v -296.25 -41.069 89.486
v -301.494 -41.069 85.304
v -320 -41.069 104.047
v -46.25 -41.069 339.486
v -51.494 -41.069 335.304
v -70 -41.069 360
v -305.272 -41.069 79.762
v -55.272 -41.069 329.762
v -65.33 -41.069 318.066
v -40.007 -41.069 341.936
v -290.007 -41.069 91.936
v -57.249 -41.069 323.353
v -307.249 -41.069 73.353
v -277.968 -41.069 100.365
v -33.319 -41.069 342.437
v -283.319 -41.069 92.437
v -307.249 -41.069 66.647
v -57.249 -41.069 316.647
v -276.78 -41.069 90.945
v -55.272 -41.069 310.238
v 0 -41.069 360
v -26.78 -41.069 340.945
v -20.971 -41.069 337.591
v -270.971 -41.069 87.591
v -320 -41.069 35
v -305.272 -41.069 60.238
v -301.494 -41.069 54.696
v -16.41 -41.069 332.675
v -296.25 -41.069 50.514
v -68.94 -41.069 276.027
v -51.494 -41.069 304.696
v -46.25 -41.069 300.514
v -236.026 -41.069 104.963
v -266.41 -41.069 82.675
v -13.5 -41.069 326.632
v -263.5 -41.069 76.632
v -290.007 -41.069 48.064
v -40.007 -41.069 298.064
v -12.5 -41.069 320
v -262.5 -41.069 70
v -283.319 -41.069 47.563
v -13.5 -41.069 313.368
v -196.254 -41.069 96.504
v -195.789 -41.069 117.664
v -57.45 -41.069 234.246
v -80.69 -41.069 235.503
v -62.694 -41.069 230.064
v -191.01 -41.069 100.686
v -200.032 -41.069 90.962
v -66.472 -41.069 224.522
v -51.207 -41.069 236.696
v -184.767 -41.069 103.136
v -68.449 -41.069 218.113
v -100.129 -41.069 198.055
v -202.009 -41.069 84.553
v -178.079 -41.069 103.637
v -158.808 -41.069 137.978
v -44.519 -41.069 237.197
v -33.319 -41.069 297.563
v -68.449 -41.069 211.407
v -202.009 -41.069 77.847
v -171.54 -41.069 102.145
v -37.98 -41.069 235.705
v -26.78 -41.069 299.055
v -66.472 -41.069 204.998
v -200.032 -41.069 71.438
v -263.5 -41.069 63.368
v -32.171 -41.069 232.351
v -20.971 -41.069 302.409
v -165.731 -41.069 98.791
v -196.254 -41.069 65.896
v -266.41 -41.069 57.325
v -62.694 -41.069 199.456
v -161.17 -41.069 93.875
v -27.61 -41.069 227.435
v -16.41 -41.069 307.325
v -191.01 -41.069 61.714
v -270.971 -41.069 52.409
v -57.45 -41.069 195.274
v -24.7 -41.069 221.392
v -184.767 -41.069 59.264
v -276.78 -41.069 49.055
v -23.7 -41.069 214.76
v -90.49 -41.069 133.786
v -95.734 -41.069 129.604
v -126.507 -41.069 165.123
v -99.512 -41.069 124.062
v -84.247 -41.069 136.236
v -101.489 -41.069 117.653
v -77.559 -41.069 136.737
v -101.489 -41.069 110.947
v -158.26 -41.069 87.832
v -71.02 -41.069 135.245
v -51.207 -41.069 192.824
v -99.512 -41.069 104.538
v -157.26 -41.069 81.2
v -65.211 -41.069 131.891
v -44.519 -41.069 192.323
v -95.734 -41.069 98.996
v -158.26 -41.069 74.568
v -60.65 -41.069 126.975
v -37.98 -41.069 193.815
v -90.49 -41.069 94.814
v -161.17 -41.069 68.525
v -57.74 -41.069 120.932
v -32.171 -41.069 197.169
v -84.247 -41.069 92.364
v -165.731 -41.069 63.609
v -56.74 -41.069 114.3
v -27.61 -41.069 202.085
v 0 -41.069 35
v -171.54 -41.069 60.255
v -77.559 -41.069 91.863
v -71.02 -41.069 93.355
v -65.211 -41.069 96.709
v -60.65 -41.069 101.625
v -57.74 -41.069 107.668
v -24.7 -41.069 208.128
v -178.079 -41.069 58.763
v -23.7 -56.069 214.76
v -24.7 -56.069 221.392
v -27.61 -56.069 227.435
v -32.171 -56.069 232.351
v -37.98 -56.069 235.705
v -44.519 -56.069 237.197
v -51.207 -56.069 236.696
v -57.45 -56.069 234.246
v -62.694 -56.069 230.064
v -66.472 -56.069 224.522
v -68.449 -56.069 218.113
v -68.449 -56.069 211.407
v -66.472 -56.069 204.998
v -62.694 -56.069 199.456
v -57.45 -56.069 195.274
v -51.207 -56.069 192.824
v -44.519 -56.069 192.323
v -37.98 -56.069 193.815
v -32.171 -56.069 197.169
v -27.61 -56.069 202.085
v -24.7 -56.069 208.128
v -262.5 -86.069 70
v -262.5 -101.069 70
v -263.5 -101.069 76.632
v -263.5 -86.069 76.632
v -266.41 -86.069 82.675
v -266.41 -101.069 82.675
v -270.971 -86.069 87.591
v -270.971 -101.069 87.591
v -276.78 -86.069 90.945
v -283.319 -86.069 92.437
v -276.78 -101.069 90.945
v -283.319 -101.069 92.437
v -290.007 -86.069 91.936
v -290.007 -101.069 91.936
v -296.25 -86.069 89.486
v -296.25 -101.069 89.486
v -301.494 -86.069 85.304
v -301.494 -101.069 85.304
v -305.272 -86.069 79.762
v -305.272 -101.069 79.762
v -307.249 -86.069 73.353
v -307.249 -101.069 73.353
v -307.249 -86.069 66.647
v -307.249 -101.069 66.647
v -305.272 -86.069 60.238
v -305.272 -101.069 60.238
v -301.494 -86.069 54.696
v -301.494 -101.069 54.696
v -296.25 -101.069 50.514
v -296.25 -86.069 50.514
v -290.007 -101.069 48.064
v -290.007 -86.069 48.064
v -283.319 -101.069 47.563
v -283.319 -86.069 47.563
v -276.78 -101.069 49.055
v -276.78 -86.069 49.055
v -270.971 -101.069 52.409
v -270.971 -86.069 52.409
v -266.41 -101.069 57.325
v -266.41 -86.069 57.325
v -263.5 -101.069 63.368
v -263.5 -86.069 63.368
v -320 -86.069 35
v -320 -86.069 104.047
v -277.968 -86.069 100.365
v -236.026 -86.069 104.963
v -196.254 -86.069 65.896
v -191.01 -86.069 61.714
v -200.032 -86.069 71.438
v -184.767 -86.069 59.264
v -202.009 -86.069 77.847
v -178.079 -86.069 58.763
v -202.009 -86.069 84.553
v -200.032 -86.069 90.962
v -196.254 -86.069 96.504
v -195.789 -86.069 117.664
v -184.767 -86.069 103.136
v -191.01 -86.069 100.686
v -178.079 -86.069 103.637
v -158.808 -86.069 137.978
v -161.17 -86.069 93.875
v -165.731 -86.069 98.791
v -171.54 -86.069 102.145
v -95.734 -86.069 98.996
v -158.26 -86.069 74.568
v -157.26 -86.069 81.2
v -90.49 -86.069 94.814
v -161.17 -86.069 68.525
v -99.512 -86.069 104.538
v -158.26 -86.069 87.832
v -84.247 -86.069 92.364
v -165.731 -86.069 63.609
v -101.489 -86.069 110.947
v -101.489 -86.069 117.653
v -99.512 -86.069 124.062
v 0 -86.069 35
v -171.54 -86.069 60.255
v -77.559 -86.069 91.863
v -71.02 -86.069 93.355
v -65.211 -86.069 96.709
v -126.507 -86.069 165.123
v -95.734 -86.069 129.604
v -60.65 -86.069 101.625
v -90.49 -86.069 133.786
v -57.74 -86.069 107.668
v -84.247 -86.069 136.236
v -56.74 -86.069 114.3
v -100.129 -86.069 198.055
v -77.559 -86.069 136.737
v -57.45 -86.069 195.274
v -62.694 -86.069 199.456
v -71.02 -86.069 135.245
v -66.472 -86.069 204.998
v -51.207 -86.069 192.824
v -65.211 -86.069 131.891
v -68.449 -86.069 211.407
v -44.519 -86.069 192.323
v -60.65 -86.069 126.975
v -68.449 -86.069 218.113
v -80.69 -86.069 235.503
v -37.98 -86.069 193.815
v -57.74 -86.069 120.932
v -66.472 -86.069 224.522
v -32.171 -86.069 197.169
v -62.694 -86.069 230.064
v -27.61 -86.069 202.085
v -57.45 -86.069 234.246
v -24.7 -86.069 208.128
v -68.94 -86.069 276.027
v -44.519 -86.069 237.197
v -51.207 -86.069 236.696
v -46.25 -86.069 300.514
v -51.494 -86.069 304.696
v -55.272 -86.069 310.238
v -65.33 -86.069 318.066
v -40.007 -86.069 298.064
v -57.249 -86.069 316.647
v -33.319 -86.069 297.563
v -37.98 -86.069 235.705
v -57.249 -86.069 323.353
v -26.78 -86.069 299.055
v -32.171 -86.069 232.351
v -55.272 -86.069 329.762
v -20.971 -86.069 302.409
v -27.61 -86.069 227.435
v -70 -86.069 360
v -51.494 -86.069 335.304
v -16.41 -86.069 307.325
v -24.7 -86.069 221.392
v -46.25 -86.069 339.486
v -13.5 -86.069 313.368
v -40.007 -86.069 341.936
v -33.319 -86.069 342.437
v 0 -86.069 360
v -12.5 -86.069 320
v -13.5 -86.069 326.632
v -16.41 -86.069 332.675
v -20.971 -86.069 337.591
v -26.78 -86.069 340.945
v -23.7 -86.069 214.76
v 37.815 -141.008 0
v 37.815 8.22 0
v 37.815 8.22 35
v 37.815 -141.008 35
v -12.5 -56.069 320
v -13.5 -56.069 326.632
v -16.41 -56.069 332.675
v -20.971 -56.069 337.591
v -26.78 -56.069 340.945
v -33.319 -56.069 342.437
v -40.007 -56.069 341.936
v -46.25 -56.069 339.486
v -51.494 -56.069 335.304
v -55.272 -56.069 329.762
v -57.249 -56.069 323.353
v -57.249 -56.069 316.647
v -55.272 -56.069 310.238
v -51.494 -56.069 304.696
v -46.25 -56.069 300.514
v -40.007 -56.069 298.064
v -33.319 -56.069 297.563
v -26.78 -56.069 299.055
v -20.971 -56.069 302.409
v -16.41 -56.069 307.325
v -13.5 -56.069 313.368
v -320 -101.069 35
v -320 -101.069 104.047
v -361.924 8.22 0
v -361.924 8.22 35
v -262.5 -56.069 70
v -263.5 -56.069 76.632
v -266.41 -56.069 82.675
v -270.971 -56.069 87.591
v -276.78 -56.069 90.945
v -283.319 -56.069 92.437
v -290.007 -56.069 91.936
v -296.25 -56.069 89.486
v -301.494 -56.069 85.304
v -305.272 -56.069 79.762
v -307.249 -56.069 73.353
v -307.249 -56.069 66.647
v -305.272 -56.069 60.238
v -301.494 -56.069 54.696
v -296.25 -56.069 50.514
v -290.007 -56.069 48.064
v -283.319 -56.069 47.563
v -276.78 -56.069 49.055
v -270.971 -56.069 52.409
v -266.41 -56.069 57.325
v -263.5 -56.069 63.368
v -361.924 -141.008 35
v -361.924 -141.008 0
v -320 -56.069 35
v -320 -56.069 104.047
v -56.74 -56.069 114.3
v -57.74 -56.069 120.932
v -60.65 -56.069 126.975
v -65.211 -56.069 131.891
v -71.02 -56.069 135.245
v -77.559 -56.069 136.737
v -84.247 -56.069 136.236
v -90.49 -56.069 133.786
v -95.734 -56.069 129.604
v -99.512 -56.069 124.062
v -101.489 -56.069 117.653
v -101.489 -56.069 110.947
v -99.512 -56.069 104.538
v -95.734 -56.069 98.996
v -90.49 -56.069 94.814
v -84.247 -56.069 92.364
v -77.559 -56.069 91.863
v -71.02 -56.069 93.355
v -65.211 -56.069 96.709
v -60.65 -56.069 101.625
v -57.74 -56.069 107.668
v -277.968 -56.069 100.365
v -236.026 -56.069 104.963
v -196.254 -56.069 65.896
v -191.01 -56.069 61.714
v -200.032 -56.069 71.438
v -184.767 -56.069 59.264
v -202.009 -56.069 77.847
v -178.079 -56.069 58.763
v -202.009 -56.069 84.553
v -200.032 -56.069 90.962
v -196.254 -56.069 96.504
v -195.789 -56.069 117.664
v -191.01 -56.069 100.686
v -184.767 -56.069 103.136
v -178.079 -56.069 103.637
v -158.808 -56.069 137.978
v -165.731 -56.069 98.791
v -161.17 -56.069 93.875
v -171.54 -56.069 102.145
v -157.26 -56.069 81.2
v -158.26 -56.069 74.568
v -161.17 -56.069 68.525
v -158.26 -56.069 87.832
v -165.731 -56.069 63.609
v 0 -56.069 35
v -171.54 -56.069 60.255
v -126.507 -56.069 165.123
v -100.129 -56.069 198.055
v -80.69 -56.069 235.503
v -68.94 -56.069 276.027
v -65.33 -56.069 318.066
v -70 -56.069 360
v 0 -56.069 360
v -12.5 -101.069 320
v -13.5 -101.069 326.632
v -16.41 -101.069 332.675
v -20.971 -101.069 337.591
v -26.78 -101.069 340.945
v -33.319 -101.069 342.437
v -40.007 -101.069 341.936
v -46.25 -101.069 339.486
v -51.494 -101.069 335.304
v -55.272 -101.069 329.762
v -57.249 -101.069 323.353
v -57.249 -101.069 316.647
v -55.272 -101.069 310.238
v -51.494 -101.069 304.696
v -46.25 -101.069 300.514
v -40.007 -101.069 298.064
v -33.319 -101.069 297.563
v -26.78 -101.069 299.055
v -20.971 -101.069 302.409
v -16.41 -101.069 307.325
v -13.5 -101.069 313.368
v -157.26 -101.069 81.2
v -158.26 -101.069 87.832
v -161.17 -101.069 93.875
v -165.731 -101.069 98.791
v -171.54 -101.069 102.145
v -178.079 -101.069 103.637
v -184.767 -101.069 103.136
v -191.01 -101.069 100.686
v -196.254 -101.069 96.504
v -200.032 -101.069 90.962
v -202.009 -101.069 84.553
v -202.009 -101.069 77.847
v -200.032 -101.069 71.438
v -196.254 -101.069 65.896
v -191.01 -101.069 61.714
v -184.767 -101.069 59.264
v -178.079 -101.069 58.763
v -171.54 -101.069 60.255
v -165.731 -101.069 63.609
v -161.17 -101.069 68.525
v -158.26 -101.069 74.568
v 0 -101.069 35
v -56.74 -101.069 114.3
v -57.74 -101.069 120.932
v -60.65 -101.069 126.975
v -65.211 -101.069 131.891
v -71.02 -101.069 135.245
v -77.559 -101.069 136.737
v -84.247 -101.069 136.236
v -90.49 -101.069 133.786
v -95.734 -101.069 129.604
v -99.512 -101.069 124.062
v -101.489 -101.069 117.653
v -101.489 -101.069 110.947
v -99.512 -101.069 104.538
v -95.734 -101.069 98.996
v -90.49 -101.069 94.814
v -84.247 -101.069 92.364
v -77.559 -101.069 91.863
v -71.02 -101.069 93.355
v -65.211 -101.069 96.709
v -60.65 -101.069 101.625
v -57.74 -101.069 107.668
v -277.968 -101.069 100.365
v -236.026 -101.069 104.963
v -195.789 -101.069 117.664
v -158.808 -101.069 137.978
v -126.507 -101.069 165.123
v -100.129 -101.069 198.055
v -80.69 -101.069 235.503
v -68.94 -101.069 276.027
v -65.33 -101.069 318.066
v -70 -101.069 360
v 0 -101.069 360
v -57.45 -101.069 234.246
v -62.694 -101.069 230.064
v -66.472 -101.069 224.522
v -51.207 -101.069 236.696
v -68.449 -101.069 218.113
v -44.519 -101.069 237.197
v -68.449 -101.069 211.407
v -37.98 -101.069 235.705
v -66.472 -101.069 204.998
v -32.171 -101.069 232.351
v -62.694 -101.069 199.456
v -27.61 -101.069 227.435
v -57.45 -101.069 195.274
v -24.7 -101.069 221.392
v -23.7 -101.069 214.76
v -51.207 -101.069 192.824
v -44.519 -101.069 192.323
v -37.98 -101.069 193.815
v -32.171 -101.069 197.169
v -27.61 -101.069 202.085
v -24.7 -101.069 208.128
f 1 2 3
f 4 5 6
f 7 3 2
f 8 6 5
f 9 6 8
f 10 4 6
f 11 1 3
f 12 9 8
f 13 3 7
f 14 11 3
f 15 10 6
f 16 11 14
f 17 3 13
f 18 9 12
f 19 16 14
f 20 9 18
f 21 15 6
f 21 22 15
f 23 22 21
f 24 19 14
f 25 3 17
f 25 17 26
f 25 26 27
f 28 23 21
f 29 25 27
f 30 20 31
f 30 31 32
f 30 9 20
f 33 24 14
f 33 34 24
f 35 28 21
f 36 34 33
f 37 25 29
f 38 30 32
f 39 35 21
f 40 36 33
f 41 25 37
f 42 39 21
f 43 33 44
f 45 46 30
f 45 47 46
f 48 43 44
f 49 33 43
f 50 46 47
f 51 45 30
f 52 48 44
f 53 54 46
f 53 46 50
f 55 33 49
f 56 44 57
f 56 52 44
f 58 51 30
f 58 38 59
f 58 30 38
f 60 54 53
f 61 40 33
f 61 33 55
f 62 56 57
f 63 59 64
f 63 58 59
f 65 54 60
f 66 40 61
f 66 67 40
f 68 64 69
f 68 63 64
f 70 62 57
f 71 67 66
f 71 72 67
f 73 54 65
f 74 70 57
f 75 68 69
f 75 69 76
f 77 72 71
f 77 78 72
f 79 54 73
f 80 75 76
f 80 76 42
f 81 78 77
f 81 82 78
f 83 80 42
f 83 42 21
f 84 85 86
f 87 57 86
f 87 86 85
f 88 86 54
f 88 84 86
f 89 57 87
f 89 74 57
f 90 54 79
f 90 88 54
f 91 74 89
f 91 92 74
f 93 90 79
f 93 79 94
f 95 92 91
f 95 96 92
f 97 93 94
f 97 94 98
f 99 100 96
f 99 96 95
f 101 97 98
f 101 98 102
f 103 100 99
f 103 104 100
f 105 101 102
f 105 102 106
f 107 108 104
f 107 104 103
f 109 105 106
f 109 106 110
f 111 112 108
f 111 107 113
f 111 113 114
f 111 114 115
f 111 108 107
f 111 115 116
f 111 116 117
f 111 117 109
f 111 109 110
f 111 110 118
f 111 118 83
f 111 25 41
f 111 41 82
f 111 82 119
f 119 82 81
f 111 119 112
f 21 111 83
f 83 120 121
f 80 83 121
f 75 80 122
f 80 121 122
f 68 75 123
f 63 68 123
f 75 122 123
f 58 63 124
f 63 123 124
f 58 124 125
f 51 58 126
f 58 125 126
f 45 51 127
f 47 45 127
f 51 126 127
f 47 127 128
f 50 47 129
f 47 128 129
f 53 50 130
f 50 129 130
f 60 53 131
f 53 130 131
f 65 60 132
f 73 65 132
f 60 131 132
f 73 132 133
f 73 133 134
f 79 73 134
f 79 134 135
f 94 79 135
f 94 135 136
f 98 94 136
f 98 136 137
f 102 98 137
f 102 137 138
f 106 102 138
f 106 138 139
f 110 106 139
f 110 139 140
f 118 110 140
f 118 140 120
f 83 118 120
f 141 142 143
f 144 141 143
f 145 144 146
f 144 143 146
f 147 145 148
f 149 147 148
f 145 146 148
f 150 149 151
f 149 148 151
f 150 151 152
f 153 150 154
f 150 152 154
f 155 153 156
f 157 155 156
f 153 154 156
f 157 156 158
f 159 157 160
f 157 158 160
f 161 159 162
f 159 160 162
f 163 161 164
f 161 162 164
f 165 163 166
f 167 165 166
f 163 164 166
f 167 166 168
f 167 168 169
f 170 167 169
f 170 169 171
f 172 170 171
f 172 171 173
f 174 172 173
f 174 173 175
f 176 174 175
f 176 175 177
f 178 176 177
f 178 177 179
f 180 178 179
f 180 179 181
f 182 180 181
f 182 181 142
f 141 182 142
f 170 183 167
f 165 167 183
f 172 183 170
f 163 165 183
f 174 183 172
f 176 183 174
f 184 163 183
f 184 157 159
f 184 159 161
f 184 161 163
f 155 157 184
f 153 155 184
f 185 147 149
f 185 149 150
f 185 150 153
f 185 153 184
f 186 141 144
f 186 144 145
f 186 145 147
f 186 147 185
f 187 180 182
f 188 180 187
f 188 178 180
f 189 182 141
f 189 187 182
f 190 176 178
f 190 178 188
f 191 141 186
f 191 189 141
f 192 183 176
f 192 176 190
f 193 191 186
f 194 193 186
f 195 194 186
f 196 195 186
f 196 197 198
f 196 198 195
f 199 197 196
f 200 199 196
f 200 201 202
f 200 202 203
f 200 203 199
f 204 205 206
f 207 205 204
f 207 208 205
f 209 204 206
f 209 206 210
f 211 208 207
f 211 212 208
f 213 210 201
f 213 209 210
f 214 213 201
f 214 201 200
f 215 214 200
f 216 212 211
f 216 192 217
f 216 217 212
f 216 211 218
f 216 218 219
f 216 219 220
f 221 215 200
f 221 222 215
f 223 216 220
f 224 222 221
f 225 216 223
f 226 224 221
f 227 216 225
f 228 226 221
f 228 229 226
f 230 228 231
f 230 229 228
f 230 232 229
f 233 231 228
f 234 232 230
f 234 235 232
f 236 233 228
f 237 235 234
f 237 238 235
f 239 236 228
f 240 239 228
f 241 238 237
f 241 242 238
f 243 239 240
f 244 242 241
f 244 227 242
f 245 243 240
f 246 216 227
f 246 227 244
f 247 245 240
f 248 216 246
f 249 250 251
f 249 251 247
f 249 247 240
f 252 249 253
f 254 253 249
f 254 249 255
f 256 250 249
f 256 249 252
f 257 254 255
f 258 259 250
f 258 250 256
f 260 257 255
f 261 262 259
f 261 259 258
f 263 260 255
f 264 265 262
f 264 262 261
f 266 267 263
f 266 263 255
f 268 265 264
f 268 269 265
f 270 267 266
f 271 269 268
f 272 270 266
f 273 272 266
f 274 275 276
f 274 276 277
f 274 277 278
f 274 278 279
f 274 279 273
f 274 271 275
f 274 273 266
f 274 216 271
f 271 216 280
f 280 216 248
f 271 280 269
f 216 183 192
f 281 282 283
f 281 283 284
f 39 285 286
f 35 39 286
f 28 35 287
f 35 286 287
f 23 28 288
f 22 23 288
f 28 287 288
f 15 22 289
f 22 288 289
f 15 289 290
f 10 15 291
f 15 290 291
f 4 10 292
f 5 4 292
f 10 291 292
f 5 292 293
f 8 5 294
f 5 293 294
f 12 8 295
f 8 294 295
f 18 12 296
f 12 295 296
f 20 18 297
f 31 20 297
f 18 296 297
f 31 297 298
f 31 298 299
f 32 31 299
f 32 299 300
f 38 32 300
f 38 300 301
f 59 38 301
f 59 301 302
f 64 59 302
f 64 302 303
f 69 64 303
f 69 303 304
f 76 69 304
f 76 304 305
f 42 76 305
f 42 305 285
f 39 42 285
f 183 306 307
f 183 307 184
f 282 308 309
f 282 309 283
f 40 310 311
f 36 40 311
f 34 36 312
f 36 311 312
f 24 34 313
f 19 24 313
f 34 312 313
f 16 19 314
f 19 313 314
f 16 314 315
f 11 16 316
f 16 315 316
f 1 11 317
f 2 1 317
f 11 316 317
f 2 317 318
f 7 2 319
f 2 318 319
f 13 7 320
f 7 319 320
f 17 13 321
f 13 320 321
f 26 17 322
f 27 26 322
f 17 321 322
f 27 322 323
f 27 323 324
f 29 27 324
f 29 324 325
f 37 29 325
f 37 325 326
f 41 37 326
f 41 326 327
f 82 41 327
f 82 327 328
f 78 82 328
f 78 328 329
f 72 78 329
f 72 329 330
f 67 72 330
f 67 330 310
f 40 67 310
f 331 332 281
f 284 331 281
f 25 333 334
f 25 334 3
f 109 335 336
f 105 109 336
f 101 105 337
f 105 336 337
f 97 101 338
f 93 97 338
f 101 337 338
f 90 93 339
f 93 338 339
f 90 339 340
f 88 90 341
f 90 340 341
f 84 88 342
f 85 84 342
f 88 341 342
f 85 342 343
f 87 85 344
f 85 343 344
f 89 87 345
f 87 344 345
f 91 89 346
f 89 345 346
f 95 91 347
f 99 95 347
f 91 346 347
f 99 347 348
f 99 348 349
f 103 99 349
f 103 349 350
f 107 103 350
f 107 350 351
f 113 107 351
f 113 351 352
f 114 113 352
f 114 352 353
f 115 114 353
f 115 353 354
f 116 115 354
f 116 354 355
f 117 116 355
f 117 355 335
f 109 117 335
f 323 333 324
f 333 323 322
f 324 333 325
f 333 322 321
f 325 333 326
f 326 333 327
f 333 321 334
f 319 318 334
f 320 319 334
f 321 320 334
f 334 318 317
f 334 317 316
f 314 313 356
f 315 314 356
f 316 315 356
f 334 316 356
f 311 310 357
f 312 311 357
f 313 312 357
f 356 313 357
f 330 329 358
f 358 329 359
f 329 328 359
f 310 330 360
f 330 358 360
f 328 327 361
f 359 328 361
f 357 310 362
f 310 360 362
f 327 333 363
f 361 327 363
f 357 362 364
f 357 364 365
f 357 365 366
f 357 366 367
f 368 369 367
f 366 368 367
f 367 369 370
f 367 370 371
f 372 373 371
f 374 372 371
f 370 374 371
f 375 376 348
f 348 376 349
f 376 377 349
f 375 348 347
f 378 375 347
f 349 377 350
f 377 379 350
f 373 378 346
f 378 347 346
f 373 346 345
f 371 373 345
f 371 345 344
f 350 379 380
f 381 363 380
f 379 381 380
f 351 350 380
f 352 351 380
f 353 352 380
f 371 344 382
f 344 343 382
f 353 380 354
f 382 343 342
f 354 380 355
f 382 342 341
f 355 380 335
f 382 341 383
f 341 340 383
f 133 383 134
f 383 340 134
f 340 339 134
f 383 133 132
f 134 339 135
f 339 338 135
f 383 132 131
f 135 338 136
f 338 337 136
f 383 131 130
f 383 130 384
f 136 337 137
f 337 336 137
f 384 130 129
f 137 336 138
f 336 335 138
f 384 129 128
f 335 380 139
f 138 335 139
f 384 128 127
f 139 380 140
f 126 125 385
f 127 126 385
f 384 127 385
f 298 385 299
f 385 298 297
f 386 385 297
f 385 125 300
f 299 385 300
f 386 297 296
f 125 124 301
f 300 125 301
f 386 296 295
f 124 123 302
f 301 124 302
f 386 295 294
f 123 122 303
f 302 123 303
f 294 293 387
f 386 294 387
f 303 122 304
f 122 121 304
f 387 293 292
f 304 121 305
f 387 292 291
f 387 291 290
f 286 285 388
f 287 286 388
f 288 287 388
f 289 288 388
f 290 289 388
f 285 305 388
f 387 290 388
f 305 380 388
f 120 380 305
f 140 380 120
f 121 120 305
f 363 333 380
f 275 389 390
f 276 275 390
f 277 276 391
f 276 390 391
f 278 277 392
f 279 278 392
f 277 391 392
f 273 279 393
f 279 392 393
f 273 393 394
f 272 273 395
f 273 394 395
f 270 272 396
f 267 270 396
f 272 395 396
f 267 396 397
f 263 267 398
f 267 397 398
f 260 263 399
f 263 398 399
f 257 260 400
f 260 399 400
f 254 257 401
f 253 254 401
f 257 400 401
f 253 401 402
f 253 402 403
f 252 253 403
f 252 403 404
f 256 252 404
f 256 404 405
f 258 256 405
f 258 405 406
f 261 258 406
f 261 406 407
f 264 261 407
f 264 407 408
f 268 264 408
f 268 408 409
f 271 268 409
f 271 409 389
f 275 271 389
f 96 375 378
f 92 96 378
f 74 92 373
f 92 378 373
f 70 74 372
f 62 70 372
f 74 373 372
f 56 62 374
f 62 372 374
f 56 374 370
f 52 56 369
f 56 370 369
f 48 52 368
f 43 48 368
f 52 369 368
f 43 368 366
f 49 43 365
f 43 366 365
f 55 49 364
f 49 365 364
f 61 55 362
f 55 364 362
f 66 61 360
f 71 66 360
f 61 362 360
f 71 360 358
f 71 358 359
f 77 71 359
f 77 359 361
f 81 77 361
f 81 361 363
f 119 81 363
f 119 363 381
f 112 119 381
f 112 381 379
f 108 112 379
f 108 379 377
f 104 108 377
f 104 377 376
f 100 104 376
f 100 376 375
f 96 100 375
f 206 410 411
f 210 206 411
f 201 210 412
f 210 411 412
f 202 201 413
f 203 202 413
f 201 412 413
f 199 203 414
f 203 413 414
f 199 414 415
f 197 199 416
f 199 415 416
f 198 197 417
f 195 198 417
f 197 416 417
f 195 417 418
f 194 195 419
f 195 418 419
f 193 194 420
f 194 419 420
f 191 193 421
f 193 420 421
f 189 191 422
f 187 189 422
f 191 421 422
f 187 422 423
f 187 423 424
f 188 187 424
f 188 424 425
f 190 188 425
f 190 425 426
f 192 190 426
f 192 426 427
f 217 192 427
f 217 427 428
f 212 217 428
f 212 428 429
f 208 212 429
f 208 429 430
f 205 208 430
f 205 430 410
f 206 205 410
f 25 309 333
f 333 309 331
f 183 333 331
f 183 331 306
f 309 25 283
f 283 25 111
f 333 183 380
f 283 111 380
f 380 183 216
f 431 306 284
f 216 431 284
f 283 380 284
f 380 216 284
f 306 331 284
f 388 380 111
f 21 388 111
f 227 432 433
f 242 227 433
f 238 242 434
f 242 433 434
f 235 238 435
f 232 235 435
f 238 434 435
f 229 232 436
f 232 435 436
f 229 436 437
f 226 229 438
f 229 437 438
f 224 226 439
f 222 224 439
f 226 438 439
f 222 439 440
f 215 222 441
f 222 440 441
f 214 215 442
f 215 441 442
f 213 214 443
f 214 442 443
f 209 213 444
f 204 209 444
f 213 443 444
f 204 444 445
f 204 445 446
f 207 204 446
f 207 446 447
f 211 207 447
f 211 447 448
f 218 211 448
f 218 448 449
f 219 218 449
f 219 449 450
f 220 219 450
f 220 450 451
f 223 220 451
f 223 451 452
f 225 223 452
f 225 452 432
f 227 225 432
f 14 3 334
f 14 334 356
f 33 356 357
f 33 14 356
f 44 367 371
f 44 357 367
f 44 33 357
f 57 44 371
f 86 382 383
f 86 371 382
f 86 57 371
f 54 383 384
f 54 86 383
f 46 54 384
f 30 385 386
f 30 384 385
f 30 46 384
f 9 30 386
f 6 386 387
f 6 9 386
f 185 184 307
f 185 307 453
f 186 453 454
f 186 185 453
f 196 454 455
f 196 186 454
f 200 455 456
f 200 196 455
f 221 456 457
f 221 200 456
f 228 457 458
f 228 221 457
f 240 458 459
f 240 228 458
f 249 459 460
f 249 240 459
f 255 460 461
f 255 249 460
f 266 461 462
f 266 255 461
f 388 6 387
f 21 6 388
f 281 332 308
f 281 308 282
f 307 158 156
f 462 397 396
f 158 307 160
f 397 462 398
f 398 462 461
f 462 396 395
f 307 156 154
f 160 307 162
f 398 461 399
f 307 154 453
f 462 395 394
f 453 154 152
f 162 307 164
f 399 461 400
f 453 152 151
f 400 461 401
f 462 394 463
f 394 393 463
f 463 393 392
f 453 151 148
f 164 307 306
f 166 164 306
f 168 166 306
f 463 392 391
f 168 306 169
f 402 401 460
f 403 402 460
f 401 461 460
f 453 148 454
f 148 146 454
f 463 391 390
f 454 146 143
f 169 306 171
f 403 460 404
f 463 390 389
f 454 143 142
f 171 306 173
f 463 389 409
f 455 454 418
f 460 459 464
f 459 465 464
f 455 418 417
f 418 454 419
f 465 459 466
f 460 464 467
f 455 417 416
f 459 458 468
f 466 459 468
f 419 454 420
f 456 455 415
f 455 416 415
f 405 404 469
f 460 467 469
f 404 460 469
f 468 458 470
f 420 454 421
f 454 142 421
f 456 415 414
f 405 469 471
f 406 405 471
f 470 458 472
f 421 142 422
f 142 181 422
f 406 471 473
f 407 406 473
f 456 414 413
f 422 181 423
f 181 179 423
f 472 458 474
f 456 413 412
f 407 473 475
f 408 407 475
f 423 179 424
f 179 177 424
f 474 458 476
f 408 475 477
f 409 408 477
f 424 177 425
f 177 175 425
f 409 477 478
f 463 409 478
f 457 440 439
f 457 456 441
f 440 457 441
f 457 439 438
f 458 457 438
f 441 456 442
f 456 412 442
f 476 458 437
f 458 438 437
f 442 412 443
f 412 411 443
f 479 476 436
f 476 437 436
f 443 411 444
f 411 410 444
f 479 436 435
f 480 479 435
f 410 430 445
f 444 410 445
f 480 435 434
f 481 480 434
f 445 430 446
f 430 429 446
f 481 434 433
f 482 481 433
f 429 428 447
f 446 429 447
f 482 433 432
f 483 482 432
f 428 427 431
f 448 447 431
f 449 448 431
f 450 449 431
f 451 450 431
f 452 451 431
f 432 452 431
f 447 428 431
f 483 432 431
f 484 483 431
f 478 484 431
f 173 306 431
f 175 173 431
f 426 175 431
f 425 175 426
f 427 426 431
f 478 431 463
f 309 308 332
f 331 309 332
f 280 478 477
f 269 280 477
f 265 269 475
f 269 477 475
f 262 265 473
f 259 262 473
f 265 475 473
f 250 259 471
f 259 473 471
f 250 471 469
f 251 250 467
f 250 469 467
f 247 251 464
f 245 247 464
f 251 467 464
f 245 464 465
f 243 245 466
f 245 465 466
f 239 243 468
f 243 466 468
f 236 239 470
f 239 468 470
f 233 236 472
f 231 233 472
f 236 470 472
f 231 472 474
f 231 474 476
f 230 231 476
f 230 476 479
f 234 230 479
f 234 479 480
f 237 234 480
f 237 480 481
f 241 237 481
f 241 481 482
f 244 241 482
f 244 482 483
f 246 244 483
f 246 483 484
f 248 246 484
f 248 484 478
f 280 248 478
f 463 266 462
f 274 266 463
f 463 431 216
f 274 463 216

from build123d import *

# Parameters (mm, degrees)
F0_W     = 320
F0_H     = 60
F1_DEPTH = 360
F2_R     = 22.5
F3_DEPTH = 60
F5_DEPTH = 101.068698
F6_W     = 30
F6_H     = 360
F7_DEPTH = 320
F8_W     = 399.738486
F8_H     = 149.227709
F9_DEPTH = 35


with BuildPart() as f1:
    # F0 (on Top) → F1 (new body)
    with BuildSketch(Plane.XY):
        with Locations((-160, -71.068698)):
            Rectangle(F0_W, F0_H)
    extrude(amount=F1_DEPTH)

    # F2 (on face) → F3 (cut, through all)
    with BuildSketch(Plane.XZ.offset(101.068698)):
        with Locations((-35, 320)):
            Circle(F2_R)
        with Locations((-285, 70)):
            Circle(F2_R)
        with Locations((-179.76, 81.2)):
            Circle(F2_R)
        with Locations((-79.24, 114.3)):
            Circle(F2_R)
        with Locations((-46.2, 214.76)):
            Circle(F2_R)
    extrude(amount=-F3_DEPTH, mode=Mode.SUBTRACT)

    # F4 (on Front) → F5 (cut, through all)
    with BuildSketch(Plane.XZ):
        with BuildLine():
            Line((-320, 360), (-320, 104.046823))
            ThreePointArc((-320, 104.046823), (-126.506917, 165.123399), (-70, 360))
            Line((-70, 360), (-320, 360))
        make_face()
    extrude(amount=F5_DEPTH, mode=Mode.SUBTRACT)

    # F6 (on Right) → F7 (cut, through all)
    with BuildSketch(Plane.YZ):
        with Locations((-71.068698, 180)):
            Rectangle(F6_W, F6_H)
    extrude(amount=-F7_DEPTH, mode=Mode.SUBTRACT)

    # F8 (on face) → F9 (join)
    with BuildSketch(Plane(origin=(0, 0, 0), x_dir=(1, 0, 0), z_dir=(0, 0, -1))):
        with Locations((-162.054332, 66.393896)):
            Rectangle(F8_W, F8_H)
    extrude(amount=-F9_DEPTH)


solid = f1.part
